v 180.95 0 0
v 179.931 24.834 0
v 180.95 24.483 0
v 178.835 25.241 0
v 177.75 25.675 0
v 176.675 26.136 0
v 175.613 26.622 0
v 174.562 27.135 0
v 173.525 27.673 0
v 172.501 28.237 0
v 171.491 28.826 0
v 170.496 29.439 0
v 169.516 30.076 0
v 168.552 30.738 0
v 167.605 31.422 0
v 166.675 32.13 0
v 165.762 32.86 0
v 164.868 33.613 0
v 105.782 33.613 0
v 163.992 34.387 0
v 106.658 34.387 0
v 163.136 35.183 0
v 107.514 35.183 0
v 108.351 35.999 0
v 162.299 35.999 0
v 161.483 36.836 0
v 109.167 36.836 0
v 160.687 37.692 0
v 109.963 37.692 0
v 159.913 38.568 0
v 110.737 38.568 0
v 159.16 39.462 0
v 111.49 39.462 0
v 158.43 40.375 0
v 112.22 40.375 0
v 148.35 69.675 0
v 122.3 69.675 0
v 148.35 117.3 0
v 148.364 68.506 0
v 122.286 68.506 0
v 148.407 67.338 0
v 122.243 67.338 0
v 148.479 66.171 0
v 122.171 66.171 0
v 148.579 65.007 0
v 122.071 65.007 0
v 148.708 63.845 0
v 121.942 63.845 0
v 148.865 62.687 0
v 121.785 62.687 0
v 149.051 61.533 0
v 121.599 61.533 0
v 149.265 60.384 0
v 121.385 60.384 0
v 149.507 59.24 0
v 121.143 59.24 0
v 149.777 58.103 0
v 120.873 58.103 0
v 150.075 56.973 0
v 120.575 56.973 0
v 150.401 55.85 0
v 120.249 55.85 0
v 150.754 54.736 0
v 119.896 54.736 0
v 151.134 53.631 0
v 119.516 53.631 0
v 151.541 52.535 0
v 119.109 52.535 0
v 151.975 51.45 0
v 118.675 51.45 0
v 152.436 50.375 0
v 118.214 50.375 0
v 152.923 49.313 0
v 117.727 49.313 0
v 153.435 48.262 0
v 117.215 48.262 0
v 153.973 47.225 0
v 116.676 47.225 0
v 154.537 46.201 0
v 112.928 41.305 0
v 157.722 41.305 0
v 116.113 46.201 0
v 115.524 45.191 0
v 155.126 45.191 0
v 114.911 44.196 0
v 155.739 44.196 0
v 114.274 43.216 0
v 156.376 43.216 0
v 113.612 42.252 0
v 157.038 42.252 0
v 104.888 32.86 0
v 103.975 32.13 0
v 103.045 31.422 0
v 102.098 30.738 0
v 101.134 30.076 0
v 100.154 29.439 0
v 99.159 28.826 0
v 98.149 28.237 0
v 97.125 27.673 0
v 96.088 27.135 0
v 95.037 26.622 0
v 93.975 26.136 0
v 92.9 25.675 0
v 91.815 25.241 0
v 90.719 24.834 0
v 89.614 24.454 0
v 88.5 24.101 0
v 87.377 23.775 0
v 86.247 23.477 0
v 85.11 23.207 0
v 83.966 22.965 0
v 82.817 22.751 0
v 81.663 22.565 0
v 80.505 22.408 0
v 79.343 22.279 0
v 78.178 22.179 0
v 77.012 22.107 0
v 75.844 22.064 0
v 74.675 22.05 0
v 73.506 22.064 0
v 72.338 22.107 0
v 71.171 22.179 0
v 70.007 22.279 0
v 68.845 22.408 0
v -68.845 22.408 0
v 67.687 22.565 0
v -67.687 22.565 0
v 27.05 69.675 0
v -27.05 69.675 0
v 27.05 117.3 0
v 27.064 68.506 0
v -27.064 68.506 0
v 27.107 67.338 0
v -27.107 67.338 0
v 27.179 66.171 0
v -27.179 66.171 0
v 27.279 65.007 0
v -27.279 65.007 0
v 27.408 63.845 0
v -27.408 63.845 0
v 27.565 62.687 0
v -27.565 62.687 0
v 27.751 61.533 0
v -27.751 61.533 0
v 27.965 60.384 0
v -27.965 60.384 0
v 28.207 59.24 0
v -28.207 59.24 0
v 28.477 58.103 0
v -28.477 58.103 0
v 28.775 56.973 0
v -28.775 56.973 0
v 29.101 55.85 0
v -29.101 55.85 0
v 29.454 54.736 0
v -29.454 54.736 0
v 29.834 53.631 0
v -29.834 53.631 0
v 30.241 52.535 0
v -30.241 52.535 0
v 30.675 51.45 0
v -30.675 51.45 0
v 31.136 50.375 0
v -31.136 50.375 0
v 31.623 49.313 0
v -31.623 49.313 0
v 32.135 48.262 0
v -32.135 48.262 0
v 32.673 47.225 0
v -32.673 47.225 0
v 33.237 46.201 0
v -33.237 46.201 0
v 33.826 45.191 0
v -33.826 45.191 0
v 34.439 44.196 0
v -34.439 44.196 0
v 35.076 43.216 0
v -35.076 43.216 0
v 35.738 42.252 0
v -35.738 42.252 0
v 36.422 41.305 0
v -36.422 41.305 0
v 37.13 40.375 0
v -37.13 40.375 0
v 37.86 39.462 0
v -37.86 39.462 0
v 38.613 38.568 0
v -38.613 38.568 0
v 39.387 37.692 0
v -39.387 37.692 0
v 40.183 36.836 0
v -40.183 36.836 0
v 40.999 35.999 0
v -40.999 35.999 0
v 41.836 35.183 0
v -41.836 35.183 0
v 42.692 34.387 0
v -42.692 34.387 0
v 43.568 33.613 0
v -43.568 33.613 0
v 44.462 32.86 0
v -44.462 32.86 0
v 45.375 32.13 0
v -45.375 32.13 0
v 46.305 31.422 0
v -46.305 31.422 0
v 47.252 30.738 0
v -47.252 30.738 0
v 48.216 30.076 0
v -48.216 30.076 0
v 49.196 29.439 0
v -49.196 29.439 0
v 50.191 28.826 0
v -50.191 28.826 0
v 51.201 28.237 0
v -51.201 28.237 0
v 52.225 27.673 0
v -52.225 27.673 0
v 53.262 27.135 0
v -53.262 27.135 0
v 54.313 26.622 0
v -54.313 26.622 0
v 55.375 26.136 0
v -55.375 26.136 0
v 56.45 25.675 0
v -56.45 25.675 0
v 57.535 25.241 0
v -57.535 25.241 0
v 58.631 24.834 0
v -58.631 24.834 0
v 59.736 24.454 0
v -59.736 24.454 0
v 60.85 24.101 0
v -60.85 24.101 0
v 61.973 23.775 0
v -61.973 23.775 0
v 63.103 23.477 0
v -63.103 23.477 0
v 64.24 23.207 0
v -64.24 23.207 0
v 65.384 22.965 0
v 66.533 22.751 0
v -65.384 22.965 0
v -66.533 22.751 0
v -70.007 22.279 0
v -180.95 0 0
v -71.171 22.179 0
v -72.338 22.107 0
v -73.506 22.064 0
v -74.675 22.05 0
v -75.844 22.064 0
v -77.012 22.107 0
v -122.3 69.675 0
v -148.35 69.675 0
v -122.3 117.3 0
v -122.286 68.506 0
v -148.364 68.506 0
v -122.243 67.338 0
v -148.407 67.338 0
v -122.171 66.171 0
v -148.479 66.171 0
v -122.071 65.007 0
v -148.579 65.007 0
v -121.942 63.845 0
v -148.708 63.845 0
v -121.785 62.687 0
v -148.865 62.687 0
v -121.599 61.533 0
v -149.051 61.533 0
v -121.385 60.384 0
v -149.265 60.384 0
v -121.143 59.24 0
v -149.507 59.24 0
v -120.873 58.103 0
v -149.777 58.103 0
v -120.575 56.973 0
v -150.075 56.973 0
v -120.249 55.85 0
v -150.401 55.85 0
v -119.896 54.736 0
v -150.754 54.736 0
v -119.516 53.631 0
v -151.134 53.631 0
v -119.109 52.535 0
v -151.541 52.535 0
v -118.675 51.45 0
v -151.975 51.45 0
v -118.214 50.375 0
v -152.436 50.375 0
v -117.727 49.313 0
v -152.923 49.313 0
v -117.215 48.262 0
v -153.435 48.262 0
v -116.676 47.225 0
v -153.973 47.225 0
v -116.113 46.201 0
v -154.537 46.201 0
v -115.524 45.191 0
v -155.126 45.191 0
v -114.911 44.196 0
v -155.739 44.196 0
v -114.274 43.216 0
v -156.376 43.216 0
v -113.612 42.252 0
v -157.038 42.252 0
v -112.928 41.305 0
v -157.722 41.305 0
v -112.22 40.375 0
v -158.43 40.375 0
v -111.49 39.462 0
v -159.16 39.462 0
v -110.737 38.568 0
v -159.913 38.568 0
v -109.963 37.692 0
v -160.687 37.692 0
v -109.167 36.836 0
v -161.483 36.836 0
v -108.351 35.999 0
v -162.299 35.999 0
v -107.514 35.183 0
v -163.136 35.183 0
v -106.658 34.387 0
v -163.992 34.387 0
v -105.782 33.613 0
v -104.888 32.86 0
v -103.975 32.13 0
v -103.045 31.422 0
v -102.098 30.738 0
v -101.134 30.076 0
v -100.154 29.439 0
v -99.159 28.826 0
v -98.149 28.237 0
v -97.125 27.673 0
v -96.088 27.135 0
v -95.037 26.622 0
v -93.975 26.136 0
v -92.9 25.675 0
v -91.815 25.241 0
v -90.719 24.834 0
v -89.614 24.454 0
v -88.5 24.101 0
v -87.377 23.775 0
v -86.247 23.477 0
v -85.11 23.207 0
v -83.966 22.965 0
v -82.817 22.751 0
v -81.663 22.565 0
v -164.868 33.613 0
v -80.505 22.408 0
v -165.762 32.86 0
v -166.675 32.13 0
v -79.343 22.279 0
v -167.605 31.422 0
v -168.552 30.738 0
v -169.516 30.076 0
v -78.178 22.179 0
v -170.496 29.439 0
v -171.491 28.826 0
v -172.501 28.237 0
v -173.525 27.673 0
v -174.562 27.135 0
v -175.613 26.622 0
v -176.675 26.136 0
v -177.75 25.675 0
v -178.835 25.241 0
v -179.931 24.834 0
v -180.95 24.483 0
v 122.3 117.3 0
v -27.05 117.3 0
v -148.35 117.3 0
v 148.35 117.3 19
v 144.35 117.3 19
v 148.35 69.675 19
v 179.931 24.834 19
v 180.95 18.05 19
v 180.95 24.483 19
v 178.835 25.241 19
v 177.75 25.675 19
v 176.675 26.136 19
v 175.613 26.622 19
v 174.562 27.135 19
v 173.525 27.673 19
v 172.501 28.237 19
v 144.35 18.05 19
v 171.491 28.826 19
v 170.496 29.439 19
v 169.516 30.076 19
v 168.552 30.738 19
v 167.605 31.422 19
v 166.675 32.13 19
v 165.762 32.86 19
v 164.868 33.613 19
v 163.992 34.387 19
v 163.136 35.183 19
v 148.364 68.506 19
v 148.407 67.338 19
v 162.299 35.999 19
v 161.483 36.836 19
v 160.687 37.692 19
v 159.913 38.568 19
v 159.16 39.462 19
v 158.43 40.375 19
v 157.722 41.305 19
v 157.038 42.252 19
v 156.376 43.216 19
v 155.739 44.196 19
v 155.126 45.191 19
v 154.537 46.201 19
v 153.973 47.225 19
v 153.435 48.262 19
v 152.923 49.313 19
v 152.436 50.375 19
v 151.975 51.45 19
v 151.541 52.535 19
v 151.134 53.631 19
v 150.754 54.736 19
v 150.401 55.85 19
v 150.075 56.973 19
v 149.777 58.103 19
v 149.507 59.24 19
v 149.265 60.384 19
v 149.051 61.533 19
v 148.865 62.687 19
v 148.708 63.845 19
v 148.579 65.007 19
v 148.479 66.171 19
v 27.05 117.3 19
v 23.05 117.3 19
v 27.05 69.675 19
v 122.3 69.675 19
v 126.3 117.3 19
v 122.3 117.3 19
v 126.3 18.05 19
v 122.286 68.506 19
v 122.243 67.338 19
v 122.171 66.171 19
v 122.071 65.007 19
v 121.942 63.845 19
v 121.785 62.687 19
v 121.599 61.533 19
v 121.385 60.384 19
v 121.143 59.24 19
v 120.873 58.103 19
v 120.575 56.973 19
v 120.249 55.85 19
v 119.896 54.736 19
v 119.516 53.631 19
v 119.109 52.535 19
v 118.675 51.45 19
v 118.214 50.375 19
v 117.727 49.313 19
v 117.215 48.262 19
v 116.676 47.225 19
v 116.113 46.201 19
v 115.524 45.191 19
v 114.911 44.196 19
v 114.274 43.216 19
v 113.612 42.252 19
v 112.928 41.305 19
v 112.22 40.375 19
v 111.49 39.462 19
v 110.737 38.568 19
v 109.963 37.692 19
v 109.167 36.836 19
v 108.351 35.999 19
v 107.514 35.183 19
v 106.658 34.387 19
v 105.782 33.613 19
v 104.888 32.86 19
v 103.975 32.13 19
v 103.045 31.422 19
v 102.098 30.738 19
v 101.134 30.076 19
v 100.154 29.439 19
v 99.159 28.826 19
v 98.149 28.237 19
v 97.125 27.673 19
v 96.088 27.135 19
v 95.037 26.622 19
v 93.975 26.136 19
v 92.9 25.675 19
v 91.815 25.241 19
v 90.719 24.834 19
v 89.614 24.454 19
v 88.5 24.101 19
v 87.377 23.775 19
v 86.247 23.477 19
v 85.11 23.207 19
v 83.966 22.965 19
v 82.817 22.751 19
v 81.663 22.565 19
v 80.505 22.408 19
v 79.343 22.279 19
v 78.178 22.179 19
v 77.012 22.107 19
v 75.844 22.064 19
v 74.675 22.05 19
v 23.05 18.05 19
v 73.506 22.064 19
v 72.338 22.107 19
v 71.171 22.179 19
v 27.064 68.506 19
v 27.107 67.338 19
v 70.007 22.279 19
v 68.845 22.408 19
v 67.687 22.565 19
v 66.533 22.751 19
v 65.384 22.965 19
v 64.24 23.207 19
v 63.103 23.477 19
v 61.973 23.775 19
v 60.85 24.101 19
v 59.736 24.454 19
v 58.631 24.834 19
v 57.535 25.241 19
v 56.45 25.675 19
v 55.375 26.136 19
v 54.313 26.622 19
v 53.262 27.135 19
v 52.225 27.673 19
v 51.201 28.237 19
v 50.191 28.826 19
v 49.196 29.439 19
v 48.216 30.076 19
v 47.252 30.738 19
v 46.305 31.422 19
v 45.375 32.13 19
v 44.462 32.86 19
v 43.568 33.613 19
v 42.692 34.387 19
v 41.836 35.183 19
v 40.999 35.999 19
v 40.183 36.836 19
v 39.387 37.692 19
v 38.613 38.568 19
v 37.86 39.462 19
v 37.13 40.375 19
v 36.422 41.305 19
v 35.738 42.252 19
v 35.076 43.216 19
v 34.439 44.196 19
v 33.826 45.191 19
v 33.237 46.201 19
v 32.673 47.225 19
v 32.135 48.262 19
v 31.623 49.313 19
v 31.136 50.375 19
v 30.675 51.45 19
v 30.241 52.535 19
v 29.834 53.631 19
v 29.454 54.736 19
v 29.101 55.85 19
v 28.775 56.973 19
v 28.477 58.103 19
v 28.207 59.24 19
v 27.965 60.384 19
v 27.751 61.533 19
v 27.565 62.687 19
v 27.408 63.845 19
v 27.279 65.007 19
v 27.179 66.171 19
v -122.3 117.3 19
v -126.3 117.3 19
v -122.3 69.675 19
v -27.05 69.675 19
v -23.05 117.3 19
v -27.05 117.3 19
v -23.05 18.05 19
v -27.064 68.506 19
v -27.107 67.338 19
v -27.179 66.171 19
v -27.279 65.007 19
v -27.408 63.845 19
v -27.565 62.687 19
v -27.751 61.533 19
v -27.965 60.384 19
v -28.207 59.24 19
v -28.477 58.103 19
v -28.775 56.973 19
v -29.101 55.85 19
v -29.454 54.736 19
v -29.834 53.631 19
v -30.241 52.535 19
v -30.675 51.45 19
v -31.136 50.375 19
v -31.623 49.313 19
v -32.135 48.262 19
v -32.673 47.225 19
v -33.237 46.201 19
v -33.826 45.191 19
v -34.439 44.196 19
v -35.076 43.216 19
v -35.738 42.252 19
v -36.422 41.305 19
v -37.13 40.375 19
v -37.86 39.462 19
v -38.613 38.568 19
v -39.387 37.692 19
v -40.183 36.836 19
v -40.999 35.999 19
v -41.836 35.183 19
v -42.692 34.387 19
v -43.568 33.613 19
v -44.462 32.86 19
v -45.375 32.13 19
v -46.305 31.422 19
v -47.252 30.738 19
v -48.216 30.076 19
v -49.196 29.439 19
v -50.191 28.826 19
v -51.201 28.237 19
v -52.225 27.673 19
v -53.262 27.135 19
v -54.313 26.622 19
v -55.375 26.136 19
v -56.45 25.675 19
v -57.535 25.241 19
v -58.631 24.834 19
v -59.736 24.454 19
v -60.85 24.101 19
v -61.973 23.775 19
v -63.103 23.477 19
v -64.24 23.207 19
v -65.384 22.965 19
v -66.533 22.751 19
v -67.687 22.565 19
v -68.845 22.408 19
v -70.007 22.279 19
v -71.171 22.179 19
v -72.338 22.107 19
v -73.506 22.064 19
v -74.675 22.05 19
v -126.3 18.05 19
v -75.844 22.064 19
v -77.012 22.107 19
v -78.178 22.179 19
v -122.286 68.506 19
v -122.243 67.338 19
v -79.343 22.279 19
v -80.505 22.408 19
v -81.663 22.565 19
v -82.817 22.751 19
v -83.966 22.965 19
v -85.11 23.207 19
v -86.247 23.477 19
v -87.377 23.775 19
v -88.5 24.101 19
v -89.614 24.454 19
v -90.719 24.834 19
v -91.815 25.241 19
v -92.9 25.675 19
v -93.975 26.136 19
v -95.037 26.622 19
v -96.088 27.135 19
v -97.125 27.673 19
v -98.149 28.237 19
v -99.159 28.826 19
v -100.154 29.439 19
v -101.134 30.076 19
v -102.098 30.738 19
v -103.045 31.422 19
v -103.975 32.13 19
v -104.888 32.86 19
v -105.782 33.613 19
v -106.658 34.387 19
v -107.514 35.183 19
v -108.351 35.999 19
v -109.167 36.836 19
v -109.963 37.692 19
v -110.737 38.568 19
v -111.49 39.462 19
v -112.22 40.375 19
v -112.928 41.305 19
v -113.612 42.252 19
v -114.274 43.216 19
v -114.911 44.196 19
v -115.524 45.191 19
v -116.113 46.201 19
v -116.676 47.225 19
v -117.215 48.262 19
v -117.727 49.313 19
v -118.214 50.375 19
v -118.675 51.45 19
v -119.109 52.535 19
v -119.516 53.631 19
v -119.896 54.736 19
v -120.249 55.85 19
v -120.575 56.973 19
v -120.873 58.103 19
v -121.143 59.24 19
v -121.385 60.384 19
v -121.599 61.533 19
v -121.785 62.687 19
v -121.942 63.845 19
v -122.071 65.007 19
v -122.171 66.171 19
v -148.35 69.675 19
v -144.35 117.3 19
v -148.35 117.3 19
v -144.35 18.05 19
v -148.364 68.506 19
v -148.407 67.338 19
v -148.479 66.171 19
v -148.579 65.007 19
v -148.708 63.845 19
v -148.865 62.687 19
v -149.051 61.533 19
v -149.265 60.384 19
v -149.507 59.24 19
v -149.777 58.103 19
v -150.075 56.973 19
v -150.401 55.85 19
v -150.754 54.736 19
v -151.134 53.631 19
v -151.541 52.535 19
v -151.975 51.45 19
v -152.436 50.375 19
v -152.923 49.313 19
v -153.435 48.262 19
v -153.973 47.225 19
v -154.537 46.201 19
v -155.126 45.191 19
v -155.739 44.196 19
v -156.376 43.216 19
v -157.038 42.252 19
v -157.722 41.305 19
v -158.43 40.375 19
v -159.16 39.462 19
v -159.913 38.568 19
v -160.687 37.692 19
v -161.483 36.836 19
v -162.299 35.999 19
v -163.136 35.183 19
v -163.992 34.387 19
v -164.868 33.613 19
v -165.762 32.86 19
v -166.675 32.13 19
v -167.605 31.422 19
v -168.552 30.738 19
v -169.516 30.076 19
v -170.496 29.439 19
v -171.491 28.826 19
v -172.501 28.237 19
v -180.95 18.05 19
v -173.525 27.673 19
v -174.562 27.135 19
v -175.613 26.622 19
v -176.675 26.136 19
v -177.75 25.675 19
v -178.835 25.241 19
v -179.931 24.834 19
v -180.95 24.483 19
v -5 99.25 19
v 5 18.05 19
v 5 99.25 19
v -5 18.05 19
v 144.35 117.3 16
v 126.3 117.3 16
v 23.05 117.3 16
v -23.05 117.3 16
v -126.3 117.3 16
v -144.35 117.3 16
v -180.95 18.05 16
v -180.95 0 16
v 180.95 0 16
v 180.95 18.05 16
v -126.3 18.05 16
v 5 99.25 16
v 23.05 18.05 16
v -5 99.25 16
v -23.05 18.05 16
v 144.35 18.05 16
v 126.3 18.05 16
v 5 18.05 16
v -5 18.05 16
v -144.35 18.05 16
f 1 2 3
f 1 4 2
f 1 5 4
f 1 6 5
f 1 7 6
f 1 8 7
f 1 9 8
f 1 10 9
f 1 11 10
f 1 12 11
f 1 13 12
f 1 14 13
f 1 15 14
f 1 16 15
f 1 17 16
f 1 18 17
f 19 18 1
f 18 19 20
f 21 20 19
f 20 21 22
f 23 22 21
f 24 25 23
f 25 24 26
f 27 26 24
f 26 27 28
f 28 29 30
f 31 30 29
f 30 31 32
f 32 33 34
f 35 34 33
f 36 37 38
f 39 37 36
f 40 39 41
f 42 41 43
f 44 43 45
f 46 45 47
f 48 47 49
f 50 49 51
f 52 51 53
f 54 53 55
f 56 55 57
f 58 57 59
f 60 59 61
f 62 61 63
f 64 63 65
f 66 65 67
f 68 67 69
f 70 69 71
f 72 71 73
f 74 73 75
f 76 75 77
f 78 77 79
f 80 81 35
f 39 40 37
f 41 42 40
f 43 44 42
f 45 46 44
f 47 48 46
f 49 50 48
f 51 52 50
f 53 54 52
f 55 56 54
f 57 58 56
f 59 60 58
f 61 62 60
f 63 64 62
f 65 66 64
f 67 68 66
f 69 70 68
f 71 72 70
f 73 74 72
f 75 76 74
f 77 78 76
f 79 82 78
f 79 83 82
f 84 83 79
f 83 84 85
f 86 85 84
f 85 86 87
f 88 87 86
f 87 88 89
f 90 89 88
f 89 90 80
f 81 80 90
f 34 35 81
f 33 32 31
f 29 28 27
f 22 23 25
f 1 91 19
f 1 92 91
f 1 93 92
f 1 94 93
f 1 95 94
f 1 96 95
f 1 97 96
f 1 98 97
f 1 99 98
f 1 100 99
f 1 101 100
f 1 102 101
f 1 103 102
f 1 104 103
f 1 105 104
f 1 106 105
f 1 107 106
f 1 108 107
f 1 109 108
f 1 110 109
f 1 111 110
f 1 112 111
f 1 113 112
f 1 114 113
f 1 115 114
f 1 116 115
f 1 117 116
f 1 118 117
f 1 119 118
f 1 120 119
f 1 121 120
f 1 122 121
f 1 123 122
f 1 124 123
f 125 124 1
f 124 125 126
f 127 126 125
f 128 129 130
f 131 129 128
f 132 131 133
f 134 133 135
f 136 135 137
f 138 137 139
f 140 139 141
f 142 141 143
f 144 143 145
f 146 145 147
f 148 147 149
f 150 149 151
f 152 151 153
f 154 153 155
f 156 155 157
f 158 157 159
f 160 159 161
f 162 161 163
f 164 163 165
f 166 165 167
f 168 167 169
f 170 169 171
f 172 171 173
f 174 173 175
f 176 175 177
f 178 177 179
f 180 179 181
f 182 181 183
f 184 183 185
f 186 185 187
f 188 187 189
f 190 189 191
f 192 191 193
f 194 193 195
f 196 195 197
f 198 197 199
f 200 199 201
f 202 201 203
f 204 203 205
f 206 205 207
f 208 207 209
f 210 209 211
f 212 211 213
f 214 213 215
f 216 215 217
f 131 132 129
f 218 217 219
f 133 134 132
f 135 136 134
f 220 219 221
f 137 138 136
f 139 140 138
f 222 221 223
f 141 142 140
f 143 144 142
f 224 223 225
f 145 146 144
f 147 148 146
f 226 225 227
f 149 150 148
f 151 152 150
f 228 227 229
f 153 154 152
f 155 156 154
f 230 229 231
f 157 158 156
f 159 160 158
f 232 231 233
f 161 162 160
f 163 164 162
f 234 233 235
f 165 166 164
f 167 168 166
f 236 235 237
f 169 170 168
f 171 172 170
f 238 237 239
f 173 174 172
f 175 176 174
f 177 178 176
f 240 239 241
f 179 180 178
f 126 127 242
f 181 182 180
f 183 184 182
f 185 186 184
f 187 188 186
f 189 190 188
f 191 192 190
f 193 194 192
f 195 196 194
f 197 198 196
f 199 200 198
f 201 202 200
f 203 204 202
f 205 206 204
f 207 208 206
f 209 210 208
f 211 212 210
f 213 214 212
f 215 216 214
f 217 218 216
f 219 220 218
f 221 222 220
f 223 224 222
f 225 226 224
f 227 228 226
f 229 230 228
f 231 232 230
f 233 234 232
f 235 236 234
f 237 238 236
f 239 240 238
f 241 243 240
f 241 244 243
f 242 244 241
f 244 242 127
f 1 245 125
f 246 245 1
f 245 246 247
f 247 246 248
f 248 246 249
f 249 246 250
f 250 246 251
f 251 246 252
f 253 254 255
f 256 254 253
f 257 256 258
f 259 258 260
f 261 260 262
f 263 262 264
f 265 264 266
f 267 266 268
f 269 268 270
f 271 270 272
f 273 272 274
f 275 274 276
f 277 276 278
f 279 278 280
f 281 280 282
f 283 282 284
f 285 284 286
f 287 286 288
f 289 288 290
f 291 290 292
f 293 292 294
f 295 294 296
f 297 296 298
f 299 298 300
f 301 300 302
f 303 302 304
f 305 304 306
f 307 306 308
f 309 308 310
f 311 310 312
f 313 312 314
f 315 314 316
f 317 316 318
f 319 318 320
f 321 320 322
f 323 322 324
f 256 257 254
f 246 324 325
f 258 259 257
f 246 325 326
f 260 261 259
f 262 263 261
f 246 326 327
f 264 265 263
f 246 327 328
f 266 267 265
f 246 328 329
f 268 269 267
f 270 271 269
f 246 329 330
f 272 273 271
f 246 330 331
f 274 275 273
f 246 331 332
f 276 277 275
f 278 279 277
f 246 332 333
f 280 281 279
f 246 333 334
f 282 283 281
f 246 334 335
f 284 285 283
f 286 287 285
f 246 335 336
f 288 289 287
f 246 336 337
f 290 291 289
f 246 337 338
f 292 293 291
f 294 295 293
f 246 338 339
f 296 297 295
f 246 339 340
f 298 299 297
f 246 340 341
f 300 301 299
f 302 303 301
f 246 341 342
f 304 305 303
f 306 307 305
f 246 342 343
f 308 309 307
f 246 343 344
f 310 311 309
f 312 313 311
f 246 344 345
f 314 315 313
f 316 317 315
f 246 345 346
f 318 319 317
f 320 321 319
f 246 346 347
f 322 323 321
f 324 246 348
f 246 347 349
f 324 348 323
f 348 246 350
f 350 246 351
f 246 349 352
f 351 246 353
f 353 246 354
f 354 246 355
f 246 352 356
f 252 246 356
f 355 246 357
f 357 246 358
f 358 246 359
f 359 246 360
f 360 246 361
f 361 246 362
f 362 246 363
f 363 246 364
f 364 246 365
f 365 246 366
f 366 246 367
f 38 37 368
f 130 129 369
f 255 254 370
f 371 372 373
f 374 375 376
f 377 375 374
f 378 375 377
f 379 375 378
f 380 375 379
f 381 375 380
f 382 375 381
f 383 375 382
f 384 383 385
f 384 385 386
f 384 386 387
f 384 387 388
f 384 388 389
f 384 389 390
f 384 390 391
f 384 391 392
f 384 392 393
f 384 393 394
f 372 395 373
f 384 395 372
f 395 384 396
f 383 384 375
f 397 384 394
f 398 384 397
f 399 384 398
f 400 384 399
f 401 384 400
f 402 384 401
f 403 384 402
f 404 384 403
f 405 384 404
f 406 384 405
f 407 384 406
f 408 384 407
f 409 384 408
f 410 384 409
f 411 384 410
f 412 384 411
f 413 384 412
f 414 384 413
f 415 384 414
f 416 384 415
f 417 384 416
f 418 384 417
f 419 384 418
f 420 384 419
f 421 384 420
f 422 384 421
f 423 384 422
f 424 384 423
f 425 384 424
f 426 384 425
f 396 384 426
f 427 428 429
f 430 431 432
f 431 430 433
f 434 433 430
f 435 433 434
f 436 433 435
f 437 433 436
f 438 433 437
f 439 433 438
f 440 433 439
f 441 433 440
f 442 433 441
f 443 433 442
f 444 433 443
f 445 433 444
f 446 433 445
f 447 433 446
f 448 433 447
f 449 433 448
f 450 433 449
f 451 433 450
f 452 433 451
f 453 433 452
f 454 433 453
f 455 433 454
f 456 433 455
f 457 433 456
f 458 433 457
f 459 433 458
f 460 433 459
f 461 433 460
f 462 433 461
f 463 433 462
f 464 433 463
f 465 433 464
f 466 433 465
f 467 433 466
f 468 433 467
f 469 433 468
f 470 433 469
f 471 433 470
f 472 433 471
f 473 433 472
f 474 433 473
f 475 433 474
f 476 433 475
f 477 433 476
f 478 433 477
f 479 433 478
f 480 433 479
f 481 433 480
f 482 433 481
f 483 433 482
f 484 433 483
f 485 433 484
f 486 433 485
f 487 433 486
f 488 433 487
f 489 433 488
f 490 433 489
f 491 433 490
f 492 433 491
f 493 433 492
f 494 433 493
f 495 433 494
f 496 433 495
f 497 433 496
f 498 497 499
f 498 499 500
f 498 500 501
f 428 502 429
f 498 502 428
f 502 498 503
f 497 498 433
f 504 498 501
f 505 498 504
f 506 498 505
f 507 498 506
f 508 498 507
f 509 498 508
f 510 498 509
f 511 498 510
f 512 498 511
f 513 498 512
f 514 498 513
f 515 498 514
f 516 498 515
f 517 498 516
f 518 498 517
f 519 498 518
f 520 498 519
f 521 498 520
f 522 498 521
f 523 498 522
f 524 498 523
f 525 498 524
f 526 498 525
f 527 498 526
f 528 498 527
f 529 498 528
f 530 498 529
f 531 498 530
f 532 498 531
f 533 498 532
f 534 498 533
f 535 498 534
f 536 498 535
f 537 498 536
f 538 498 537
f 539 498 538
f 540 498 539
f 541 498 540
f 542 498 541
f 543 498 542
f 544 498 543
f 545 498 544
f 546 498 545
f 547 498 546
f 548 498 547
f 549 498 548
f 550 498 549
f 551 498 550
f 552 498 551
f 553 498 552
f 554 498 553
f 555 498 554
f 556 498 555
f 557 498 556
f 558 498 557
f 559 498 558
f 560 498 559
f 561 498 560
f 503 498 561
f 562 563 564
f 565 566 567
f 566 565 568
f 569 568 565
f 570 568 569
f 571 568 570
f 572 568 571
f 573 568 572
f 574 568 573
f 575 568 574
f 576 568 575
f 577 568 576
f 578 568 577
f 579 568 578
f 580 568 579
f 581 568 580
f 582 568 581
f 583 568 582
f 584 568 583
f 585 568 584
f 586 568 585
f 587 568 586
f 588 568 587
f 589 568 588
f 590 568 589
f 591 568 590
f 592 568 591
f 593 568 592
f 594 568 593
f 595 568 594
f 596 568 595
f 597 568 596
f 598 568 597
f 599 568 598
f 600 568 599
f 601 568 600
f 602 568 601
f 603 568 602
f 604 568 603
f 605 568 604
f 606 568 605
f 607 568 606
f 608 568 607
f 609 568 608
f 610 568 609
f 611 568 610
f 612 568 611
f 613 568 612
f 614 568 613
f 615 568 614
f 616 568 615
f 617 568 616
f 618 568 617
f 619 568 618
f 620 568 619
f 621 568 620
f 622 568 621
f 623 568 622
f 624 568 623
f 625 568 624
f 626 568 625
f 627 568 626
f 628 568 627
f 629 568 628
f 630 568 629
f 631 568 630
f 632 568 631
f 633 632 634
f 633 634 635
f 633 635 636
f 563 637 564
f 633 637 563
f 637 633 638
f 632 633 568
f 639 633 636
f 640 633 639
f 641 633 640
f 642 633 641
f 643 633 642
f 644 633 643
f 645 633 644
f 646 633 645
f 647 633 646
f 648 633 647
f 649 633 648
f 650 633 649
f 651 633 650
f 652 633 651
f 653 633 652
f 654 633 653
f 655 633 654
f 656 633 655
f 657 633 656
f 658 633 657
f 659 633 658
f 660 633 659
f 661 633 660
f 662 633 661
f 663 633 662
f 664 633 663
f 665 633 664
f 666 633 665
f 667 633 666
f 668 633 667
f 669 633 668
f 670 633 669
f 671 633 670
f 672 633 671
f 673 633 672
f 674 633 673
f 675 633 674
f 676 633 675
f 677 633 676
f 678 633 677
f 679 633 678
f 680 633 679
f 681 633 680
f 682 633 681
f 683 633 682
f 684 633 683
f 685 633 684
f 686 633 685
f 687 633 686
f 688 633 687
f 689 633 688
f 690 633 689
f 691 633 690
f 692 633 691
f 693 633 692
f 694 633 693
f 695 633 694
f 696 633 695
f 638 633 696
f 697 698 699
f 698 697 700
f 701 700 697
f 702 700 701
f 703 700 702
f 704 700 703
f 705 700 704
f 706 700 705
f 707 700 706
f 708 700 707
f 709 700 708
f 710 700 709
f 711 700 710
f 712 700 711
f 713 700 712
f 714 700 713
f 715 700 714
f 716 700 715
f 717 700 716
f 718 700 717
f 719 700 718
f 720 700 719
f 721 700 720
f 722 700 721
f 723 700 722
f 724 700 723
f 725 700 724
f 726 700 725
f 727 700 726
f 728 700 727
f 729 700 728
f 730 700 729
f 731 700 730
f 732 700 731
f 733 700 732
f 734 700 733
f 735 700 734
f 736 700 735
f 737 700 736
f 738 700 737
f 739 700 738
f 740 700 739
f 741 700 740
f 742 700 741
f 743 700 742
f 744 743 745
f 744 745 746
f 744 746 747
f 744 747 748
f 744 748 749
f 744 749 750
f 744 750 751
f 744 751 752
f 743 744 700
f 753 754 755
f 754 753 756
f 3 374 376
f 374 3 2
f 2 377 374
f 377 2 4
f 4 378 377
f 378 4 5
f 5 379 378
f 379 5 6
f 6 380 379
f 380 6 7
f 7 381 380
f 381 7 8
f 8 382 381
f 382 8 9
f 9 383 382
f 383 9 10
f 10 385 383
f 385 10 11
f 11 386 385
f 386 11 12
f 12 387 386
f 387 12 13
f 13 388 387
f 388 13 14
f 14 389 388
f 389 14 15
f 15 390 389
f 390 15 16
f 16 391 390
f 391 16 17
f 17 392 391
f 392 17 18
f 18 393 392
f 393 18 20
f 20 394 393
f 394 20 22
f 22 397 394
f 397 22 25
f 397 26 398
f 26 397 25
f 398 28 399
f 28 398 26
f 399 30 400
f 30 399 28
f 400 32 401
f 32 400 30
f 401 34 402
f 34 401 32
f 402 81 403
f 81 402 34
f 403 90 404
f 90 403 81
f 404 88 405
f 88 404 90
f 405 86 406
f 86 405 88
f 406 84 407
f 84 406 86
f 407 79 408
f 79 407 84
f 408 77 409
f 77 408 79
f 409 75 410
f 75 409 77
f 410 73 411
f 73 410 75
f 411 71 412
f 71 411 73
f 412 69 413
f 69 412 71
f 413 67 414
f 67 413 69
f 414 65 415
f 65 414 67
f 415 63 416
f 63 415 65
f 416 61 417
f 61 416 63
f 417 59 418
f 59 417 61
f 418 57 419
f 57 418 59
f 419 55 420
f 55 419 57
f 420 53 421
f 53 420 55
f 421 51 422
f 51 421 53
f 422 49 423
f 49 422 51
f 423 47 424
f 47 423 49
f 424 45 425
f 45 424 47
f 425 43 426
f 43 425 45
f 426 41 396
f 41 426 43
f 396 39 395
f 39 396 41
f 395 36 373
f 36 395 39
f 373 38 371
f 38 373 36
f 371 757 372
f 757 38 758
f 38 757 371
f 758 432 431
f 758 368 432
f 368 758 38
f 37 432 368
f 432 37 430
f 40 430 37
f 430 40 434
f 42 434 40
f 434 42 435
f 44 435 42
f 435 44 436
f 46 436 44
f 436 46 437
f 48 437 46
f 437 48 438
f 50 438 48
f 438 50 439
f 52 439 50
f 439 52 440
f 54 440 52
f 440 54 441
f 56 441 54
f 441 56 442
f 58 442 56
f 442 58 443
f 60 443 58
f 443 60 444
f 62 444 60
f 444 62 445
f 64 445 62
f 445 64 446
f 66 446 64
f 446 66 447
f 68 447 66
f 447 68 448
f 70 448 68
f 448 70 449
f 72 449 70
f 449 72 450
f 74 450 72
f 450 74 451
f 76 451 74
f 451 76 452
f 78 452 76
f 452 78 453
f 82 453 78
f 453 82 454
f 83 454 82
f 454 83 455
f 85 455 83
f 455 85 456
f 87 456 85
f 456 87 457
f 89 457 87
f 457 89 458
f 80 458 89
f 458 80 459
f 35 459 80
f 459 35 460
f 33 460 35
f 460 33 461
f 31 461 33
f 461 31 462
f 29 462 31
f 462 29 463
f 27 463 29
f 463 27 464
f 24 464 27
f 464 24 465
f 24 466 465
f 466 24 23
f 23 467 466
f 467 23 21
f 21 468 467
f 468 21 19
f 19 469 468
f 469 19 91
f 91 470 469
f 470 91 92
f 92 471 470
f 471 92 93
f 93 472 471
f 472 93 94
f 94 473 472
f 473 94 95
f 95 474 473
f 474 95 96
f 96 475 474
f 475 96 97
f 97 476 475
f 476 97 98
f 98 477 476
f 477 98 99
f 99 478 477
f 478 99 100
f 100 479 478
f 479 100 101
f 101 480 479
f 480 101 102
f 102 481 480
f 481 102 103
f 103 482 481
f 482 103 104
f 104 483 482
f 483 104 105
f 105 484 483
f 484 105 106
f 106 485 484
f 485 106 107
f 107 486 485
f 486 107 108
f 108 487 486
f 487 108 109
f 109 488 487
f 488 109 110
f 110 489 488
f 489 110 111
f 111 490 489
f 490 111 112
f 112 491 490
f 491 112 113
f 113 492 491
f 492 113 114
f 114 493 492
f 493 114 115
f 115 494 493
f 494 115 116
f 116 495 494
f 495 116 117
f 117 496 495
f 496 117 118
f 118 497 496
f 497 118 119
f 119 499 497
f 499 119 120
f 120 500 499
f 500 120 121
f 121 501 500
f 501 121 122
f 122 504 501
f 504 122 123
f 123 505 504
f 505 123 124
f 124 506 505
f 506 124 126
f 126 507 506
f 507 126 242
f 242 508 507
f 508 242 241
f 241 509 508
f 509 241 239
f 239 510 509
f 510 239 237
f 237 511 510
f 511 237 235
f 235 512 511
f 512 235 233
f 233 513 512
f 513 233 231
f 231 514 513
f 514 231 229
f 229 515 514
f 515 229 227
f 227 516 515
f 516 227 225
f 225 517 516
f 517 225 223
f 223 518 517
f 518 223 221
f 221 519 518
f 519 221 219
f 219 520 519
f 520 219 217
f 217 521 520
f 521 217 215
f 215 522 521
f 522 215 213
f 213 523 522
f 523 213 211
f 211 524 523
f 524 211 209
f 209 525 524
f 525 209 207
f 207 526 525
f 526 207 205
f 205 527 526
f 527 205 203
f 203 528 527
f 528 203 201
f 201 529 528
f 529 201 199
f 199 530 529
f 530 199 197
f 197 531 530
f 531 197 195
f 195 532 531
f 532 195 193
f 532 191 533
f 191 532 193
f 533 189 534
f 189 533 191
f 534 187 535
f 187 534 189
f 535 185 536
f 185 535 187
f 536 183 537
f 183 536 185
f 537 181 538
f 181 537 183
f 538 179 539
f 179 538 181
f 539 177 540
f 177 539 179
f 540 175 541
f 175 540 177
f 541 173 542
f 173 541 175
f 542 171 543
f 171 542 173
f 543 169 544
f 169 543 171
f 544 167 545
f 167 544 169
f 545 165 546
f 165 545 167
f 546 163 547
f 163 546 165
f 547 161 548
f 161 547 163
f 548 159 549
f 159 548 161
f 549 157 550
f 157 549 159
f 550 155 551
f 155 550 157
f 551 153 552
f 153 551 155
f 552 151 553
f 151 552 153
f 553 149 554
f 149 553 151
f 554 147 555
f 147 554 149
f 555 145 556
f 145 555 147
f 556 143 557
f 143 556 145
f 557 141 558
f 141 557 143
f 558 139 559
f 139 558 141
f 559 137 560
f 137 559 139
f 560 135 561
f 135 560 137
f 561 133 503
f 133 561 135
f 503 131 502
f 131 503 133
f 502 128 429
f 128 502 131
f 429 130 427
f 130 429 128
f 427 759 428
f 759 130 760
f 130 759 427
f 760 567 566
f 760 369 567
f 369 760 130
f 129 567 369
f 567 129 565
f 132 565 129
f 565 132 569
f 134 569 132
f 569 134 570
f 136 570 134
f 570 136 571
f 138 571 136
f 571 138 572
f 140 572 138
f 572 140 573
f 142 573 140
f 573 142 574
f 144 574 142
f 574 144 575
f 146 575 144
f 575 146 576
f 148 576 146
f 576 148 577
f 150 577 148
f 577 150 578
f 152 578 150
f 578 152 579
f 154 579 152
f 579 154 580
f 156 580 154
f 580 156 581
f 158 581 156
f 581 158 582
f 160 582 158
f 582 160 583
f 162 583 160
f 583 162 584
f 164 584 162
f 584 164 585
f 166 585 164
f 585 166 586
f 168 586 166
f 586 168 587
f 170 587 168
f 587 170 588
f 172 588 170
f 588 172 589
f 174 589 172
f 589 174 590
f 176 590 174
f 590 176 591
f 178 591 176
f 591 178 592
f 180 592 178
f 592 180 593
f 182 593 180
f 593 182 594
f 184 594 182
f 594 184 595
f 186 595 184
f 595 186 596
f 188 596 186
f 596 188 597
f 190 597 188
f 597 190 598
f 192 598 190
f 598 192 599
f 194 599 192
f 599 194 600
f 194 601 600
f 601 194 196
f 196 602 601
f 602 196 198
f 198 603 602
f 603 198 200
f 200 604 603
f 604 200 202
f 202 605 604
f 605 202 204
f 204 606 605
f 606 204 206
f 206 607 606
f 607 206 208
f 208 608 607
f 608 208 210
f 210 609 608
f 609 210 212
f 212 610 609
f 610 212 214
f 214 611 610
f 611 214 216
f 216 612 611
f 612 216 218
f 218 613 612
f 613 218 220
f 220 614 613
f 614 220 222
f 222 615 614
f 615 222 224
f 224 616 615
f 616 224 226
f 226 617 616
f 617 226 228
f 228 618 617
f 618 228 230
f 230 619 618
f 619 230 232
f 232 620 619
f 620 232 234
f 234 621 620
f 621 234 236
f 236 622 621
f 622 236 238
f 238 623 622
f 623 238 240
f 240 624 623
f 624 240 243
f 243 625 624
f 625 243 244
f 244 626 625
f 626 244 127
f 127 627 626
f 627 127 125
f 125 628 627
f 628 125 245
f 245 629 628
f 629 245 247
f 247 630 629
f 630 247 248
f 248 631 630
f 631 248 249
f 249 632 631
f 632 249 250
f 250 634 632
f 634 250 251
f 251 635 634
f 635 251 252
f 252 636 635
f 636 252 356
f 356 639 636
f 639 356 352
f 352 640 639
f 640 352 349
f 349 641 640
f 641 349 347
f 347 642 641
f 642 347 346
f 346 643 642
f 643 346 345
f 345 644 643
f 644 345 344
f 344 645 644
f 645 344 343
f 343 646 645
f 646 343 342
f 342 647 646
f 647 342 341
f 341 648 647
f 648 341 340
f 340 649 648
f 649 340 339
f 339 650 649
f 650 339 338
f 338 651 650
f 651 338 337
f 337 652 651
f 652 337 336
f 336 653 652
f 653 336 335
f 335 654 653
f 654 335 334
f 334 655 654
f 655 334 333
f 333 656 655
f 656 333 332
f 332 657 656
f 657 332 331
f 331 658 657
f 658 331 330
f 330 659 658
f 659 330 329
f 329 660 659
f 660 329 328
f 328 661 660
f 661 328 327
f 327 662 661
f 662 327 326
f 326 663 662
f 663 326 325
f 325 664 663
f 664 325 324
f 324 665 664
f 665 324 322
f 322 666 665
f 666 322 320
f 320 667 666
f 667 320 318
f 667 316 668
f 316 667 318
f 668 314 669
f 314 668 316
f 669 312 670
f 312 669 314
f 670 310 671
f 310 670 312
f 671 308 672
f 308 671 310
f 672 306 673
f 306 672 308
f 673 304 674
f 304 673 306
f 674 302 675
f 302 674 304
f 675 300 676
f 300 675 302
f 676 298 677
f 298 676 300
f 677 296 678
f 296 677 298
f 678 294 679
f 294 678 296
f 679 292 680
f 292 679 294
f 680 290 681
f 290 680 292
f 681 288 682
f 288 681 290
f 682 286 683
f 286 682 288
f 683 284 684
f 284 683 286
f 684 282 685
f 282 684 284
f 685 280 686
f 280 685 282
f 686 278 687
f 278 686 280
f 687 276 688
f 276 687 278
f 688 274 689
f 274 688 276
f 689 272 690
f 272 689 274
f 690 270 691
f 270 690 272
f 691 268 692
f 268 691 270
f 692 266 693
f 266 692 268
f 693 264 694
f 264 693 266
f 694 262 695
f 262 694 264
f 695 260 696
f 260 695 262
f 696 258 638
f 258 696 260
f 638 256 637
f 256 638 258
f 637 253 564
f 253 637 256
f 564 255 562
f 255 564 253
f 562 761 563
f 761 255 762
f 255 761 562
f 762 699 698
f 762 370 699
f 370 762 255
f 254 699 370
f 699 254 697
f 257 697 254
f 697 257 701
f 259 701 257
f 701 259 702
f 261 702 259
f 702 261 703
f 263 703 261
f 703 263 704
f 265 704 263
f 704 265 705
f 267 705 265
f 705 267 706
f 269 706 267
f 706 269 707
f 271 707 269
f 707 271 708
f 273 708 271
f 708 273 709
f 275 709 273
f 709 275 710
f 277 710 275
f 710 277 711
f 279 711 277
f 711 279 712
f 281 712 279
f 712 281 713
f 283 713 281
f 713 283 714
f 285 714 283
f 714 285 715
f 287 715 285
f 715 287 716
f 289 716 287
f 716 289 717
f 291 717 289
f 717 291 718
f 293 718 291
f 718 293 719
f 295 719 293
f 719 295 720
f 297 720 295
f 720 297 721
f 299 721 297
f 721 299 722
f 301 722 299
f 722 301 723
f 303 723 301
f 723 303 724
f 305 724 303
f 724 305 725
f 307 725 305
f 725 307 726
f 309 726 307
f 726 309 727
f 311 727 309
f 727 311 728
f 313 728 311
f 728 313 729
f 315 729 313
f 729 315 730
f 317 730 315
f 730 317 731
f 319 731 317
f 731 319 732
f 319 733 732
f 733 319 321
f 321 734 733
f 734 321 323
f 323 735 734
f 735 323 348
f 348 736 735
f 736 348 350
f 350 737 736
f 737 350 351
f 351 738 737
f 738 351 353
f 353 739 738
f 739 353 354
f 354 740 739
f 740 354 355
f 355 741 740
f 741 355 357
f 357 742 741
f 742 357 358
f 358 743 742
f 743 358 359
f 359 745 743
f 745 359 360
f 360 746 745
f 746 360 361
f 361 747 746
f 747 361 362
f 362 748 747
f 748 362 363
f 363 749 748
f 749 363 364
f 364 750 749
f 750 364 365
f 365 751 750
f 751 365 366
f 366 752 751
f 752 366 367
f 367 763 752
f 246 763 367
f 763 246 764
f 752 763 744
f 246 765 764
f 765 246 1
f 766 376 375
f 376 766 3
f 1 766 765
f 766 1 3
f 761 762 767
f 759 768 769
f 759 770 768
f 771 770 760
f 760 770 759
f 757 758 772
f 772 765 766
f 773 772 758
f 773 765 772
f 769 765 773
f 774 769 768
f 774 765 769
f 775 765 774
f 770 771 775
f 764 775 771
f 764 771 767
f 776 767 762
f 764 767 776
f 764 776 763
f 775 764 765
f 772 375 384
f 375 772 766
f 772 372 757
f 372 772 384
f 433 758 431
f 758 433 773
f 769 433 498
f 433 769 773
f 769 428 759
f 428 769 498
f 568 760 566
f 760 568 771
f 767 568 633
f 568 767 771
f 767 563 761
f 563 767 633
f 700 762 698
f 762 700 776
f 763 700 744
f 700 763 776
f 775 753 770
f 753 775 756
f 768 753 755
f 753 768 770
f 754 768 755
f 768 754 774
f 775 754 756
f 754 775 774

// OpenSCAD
// file: volleyball_pole_rack.scad
back_thickness = 18.05;
back_rabbet = 4;
vertical_thickness = 18.05;
lip_size = 4;

pole_dia = 3.75 * 25.4;
pole_spacing = vertical_thickness*2+10;

edge_spacing = 16;

w = pole_dia*2 + pole_spacing + lip_size * 3 + vertical_thickness;
h = back_thickness + lip_size + pole_dia;
inner_height = 40;
back_width = w + pole_dia;


module Profile() {
  difference() {
    translate([-back_width/2,0]) square([back_width,h]);
    for(x_scale=[1,-1]) scale([x_scale,1])
      for(x=[(pole_dia+pole_spacing)/2+lip_size, (pole_dia+pole_spacing)/2+vertical_thickness+pole_dia+lip_size*3])
        translate([x,0]) hull() {
      for(y=[pole_dia/2+back_thickness+lip_size,pole_dia+back_thickness+lip_size])
      translate([0,y])
        circle(d=pole_dia,$fn=256);
    }
  }
}

module Rabbets() {
  for(x_scale=[1,-1]) scale([x_scale,1]) {
    translate([pole_spacing/2+pole_dia+lip_size*2,0]) square([vertical_thickness,h+4]);
    translate([-pole_spacing/2,0]) square([vertical_thickness,h+4]);
  }
  translate([-back_width/2-4,0]) square([back_width+8,back_thickness]);
  translate([-pole_spacing/2,h-back_thickness])
    square([pole_spacing,back_thickness+4]);
}

module RabbetsHole() {
  t = pole_spacing-vertical_thickness*2;
  translate([-t/2,back_thickness]) square([t,h-back_thickness*2]);
}

module SpikeBox(dims, cutter_dia) {
  off = 0.78 * cutter_dia / 2;
  translate([dims[0]/2,0]) {
    square(dims, center=true);
    for(x_scale=[1,-1], y_scale=[1,-1])
      translate([(dims[0]/2-off)*x_scale, (dims[1]/2-off)*y_scale])
      circle(d=cutter_dia,$fn=64);
  }
}

module Vertical(center_cutout=true) {
  difference() {
    square([h-back_thickness-(center_cutout?vertical_thickness-back_rabbet:0)+back_rabbet,inner_height]);
  }
}

module Back() {
  difference() {
    translate([-back_width/2,0]) square([back_width,inner_height]);
    translate([0,inner_height/2]) circle(d=8,$fn=32);
    for(x_scale=[1,-1]) scale([x_scale,1]) {
      translate([(pole_dia+pole_spacing)/3,inner_height/2]) circle(d=6,$fn=32);
      translate([pole_dia+pole_spacing+vertical_thickness+lip_size*3,inner_height/2]) circle(d=6,$fn=32);
    }

    for(x_scale=[1,-1]) translate([16*25.4/2*x_scale,inner_height/2]) circle(d=6,$fn=32);
  }
}

module BackRabbets() {
  intersection() {
    translate([0,-30]) Rabbets();
    translate([-back_width/2,-5]) square([back_width,inner_height+10]);
  }
}

module Spinner() {
  r=pole_dia+pole_spacing/2;
  difference() {
    offset(r=8,$fn=32) offset(delta=-8) intersection() {
      circle(r=r,$fn=256);
      hull() {
        circle(d=pole_spacing,$fn=32);
        translate([r,10]) circle(d=pole_spacing,$fn=32);
        translate([-r,10]) circle(d=pole_spacing,$fn=32);
        translate([r,r]) circle(d=pole_spacing,$fn=32);
        translate([-r,r]) circle(d=pole_spacing,$fn=32);
      }
    }
    circle(d=8,$fn=32);
  }
}

module HBone(_w,_h,d) {
  _t=1.41*d/4;
  square([_w,_h]);
  for(x=[_t,_w-_t])
  for(y=[_t,_h-_t])
    translate([x,y]) circle(d=d,$fn=32);
}

module SpinnerPocket() {
  translate([-199/2,-19.3/2]) HBone(199,15.5,4.1);
}

module Front() {
  intersection() {
    Back();
    translate([-pole_spacing/2,0]) square([pole_spacing, inner_height]);
  }
}

module FrontRabbets() {
  intersection() {
    BackRabbets();
    translate([-pole_spacing/2,-5]) square([pole_spacing,inner_height+10]);
  }
}
// main file
include <volleyball_pole_rack.scad>;

difference() {
  linear_extrude(height=19) Profile();
  translate([0,0,16]) linear_extrude(height=10,convexity=10) offset(r=2) offset(delta=-2) Rabbets();
}

translate([0,150]) Spinner();
